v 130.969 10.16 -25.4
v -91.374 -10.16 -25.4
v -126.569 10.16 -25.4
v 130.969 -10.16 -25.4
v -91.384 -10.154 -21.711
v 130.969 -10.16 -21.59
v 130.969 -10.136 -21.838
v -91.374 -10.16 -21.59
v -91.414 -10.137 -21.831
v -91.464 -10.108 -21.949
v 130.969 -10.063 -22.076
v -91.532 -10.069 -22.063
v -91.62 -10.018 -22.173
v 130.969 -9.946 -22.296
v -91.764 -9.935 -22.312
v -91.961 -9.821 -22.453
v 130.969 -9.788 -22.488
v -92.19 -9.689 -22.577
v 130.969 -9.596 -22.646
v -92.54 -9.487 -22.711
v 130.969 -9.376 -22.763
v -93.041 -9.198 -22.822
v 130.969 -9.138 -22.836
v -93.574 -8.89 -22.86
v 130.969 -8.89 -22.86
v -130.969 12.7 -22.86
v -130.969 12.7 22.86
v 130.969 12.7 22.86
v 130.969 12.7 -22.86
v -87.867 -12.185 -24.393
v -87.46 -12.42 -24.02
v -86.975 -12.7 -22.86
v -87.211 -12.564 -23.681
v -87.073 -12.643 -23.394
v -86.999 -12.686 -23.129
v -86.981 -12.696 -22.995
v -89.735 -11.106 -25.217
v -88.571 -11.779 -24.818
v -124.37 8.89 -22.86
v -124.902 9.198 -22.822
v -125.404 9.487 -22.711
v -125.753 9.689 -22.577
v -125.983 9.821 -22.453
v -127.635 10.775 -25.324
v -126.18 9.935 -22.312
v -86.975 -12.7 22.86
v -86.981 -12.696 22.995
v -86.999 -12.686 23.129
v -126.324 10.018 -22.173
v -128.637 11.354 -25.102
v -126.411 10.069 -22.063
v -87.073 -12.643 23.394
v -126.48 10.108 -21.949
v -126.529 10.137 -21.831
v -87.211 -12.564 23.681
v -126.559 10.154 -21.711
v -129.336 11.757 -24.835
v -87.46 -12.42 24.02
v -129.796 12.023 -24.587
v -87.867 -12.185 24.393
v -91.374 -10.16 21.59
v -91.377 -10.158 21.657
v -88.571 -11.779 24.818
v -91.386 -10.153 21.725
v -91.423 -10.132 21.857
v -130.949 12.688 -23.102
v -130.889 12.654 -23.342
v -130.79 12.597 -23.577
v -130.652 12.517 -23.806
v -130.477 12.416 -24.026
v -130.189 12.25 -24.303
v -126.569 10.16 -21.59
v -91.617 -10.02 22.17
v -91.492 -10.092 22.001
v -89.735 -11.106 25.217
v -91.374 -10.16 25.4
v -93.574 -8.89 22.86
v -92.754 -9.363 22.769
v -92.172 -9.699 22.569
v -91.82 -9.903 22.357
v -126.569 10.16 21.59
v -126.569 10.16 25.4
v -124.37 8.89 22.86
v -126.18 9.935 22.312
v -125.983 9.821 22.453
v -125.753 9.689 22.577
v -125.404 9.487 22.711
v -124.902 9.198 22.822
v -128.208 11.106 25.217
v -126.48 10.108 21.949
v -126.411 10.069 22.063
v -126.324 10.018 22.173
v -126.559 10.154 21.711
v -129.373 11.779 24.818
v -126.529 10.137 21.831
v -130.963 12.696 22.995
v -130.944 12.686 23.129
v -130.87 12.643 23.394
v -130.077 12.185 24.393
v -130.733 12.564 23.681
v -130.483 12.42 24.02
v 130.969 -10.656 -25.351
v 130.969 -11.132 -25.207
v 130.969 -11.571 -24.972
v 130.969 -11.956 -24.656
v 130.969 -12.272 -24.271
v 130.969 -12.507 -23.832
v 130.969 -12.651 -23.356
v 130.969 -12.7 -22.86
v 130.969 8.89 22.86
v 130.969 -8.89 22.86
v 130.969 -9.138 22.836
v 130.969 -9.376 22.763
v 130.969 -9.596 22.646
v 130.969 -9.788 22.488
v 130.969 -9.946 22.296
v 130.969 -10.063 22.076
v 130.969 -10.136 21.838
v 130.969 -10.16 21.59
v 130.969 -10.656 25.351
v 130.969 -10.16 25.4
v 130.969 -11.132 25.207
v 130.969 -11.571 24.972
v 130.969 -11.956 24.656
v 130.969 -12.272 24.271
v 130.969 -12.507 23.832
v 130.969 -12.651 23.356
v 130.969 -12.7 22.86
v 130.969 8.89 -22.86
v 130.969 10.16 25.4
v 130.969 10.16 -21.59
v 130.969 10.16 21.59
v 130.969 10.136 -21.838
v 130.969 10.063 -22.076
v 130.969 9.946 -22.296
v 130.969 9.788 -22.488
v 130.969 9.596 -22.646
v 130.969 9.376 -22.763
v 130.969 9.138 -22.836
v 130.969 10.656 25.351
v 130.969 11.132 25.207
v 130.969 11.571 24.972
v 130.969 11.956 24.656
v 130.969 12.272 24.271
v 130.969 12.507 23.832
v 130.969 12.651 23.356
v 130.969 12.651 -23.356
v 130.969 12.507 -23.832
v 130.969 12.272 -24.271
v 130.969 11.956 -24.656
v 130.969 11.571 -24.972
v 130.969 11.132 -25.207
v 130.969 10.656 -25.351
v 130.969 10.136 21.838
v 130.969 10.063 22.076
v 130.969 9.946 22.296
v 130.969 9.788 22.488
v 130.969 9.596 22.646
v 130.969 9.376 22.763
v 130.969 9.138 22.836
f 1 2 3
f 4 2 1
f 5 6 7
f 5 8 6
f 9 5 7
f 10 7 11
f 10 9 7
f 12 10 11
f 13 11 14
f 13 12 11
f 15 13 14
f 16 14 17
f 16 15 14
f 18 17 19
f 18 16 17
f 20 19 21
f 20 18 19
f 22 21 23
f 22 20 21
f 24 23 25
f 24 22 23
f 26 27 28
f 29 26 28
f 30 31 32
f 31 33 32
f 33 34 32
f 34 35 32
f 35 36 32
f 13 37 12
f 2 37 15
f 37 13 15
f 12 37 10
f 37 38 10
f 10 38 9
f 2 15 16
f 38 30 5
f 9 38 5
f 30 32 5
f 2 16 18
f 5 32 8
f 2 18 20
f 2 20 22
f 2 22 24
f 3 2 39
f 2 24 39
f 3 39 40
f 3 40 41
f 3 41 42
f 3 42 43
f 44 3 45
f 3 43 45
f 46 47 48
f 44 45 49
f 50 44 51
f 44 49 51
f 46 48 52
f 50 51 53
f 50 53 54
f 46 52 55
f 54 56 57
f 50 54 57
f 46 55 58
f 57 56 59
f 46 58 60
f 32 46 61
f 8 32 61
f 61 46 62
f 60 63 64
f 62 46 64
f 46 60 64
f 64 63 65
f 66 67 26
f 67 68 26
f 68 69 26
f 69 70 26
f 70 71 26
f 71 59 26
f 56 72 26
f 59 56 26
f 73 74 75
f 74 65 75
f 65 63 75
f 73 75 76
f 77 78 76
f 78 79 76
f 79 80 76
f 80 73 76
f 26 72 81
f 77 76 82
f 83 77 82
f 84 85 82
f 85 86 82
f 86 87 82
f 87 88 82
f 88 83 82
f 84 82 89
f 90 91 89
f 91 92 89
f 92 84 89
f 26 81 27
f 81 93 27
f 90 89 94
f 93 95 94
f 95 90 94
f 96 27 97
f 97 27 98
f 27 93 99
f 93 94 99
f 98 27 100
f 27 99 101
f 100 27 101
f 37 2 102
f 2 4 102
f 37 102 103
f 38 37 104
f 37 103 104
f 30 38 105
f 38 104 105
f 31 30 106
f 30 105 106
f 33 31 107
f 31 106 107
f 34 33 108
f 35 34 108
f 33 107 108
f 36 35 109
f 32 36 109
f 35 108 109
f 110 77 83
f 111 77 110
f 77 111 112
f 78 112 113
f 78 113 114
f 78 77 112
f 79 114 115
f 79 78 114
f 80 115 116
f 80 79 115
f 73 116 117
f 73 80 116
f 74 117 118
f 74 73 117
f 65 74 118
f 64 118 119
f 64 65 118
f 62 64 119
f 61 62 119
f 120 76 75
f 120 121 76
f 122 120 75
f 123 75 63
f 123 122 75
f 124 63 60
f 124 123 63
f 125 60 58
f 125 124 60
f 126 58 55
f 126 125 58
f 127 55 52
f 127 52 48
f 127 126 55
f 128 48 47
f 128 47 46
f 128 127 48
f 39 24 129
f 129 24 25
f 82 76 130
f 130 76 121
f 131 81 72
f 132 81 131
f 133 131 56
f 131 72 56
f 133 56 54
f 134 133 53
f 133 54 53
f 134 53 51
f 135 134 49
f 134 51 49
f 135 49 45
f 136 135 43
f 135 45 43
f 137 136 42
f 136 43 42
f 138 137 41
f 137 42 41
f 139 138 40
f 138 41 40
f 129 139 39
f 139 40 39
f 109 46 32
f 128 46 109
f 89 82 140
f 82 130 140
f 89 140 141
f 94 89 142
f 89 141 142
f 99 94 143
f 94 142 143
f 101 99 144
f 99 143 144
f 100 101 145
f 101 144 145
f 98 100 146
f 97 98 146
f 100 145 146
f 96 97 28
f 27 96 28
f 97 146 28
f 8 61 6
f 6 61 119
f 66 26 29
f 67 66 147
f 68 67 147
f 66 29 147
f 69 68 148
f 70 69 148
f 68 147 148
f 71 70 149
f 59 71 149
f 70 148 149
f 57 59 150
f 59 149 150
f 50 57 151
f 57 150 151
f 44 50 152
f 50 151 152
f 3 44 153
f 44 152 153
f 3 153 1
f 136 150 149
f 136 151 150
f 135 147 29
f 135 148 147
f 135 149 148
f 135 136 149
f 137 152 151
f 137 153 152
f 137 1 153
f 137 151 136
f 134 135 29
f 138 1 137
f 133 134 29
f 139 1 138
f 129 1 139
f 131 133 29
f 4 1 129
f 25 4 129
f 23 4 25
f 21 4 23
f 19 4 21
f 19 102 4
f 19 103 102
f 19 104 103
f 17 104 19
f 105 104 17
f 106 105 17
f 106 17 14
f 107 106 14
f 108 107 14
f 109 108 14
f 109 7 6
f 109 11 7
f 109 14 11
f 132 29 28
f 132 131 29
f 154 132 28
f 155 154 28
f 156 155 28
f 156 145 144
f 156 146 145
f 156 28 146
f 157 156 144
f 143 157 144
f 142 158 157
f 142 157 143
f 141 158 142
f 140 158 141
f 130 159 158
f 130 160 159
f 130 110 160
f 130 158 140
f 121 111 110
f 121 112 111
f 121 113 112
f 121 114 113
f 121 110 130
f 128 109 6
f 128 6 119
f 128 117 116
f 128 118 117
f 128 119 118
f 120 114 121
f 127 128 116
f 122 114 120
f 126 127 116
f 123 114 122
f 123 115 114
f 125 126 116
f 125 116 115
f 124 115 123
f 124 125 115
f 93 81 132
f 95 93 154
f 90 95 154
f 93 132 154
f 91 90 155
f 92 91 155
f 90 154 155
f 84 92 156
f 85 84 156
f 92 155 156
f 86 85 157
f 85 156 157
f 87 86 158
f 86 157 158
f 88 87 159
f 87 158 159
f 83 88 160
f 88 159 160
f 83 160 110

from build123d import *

# Parameters (mm, degrees)
F0_W     = 261.9375
F0_H     = 50.8
F1_DEPTH = 12.7
F2_T     = -2.54
F4_DEPTH = 50.801
F5_R     = 1.27
F6_R     = 2.54


with BuildPart() as f1:
    # F0 (on Front) → F1 (new body, symmetric)
    with BuildSketch(Plane.XZ):
        Rectangle(F0_W, F0_H)
    extrude(amount=F1_DEPTH, both=True)

    # F2
    f2_openings = [f1.faces().sort_by_distance(p)[0] for p in [
        (-130.96875, 0, 0),
        (130.96875, 0, 0),
    ]]
    offset(amount=F2_T, openings=f2_openings)

    # F3 (on face) → F4 (cut, through all)
    with BuildSketch(Plane.XY.offset(25.4)):
        Polygon((-86.9746594878, -12.7), (-130.96875, 12.7), (-130.96875, -12.7), align=None)
    extrude(amount=-F4_DEPTH, mode=Mode.SUBTRACT)

    # F5
    f5_edges = [f1.edges().sort_by_distance(p)[0] for p in [
        (2.199705, 10.16, -22.86),
        (2.199705, 10.16, 22.86),
        (19.797341, -10.16, 22.86),
        (19.797341, -10.16, -22.86),
    ]]
    fillet(f5_edges, radius=F5_R)

    # F6
    f6_edges = [f1.edges().sort_by_distance(p)[0] for p in [
        (21.997045, -12.7, 25.4),
        (0, 12.7, 25.4),
        (0, 12.7, -25.4),
        (21.997045, -12.7, -25.4),
    ]]
    fillet(f6_edges, radius=F6_R)


solid = f1.part
